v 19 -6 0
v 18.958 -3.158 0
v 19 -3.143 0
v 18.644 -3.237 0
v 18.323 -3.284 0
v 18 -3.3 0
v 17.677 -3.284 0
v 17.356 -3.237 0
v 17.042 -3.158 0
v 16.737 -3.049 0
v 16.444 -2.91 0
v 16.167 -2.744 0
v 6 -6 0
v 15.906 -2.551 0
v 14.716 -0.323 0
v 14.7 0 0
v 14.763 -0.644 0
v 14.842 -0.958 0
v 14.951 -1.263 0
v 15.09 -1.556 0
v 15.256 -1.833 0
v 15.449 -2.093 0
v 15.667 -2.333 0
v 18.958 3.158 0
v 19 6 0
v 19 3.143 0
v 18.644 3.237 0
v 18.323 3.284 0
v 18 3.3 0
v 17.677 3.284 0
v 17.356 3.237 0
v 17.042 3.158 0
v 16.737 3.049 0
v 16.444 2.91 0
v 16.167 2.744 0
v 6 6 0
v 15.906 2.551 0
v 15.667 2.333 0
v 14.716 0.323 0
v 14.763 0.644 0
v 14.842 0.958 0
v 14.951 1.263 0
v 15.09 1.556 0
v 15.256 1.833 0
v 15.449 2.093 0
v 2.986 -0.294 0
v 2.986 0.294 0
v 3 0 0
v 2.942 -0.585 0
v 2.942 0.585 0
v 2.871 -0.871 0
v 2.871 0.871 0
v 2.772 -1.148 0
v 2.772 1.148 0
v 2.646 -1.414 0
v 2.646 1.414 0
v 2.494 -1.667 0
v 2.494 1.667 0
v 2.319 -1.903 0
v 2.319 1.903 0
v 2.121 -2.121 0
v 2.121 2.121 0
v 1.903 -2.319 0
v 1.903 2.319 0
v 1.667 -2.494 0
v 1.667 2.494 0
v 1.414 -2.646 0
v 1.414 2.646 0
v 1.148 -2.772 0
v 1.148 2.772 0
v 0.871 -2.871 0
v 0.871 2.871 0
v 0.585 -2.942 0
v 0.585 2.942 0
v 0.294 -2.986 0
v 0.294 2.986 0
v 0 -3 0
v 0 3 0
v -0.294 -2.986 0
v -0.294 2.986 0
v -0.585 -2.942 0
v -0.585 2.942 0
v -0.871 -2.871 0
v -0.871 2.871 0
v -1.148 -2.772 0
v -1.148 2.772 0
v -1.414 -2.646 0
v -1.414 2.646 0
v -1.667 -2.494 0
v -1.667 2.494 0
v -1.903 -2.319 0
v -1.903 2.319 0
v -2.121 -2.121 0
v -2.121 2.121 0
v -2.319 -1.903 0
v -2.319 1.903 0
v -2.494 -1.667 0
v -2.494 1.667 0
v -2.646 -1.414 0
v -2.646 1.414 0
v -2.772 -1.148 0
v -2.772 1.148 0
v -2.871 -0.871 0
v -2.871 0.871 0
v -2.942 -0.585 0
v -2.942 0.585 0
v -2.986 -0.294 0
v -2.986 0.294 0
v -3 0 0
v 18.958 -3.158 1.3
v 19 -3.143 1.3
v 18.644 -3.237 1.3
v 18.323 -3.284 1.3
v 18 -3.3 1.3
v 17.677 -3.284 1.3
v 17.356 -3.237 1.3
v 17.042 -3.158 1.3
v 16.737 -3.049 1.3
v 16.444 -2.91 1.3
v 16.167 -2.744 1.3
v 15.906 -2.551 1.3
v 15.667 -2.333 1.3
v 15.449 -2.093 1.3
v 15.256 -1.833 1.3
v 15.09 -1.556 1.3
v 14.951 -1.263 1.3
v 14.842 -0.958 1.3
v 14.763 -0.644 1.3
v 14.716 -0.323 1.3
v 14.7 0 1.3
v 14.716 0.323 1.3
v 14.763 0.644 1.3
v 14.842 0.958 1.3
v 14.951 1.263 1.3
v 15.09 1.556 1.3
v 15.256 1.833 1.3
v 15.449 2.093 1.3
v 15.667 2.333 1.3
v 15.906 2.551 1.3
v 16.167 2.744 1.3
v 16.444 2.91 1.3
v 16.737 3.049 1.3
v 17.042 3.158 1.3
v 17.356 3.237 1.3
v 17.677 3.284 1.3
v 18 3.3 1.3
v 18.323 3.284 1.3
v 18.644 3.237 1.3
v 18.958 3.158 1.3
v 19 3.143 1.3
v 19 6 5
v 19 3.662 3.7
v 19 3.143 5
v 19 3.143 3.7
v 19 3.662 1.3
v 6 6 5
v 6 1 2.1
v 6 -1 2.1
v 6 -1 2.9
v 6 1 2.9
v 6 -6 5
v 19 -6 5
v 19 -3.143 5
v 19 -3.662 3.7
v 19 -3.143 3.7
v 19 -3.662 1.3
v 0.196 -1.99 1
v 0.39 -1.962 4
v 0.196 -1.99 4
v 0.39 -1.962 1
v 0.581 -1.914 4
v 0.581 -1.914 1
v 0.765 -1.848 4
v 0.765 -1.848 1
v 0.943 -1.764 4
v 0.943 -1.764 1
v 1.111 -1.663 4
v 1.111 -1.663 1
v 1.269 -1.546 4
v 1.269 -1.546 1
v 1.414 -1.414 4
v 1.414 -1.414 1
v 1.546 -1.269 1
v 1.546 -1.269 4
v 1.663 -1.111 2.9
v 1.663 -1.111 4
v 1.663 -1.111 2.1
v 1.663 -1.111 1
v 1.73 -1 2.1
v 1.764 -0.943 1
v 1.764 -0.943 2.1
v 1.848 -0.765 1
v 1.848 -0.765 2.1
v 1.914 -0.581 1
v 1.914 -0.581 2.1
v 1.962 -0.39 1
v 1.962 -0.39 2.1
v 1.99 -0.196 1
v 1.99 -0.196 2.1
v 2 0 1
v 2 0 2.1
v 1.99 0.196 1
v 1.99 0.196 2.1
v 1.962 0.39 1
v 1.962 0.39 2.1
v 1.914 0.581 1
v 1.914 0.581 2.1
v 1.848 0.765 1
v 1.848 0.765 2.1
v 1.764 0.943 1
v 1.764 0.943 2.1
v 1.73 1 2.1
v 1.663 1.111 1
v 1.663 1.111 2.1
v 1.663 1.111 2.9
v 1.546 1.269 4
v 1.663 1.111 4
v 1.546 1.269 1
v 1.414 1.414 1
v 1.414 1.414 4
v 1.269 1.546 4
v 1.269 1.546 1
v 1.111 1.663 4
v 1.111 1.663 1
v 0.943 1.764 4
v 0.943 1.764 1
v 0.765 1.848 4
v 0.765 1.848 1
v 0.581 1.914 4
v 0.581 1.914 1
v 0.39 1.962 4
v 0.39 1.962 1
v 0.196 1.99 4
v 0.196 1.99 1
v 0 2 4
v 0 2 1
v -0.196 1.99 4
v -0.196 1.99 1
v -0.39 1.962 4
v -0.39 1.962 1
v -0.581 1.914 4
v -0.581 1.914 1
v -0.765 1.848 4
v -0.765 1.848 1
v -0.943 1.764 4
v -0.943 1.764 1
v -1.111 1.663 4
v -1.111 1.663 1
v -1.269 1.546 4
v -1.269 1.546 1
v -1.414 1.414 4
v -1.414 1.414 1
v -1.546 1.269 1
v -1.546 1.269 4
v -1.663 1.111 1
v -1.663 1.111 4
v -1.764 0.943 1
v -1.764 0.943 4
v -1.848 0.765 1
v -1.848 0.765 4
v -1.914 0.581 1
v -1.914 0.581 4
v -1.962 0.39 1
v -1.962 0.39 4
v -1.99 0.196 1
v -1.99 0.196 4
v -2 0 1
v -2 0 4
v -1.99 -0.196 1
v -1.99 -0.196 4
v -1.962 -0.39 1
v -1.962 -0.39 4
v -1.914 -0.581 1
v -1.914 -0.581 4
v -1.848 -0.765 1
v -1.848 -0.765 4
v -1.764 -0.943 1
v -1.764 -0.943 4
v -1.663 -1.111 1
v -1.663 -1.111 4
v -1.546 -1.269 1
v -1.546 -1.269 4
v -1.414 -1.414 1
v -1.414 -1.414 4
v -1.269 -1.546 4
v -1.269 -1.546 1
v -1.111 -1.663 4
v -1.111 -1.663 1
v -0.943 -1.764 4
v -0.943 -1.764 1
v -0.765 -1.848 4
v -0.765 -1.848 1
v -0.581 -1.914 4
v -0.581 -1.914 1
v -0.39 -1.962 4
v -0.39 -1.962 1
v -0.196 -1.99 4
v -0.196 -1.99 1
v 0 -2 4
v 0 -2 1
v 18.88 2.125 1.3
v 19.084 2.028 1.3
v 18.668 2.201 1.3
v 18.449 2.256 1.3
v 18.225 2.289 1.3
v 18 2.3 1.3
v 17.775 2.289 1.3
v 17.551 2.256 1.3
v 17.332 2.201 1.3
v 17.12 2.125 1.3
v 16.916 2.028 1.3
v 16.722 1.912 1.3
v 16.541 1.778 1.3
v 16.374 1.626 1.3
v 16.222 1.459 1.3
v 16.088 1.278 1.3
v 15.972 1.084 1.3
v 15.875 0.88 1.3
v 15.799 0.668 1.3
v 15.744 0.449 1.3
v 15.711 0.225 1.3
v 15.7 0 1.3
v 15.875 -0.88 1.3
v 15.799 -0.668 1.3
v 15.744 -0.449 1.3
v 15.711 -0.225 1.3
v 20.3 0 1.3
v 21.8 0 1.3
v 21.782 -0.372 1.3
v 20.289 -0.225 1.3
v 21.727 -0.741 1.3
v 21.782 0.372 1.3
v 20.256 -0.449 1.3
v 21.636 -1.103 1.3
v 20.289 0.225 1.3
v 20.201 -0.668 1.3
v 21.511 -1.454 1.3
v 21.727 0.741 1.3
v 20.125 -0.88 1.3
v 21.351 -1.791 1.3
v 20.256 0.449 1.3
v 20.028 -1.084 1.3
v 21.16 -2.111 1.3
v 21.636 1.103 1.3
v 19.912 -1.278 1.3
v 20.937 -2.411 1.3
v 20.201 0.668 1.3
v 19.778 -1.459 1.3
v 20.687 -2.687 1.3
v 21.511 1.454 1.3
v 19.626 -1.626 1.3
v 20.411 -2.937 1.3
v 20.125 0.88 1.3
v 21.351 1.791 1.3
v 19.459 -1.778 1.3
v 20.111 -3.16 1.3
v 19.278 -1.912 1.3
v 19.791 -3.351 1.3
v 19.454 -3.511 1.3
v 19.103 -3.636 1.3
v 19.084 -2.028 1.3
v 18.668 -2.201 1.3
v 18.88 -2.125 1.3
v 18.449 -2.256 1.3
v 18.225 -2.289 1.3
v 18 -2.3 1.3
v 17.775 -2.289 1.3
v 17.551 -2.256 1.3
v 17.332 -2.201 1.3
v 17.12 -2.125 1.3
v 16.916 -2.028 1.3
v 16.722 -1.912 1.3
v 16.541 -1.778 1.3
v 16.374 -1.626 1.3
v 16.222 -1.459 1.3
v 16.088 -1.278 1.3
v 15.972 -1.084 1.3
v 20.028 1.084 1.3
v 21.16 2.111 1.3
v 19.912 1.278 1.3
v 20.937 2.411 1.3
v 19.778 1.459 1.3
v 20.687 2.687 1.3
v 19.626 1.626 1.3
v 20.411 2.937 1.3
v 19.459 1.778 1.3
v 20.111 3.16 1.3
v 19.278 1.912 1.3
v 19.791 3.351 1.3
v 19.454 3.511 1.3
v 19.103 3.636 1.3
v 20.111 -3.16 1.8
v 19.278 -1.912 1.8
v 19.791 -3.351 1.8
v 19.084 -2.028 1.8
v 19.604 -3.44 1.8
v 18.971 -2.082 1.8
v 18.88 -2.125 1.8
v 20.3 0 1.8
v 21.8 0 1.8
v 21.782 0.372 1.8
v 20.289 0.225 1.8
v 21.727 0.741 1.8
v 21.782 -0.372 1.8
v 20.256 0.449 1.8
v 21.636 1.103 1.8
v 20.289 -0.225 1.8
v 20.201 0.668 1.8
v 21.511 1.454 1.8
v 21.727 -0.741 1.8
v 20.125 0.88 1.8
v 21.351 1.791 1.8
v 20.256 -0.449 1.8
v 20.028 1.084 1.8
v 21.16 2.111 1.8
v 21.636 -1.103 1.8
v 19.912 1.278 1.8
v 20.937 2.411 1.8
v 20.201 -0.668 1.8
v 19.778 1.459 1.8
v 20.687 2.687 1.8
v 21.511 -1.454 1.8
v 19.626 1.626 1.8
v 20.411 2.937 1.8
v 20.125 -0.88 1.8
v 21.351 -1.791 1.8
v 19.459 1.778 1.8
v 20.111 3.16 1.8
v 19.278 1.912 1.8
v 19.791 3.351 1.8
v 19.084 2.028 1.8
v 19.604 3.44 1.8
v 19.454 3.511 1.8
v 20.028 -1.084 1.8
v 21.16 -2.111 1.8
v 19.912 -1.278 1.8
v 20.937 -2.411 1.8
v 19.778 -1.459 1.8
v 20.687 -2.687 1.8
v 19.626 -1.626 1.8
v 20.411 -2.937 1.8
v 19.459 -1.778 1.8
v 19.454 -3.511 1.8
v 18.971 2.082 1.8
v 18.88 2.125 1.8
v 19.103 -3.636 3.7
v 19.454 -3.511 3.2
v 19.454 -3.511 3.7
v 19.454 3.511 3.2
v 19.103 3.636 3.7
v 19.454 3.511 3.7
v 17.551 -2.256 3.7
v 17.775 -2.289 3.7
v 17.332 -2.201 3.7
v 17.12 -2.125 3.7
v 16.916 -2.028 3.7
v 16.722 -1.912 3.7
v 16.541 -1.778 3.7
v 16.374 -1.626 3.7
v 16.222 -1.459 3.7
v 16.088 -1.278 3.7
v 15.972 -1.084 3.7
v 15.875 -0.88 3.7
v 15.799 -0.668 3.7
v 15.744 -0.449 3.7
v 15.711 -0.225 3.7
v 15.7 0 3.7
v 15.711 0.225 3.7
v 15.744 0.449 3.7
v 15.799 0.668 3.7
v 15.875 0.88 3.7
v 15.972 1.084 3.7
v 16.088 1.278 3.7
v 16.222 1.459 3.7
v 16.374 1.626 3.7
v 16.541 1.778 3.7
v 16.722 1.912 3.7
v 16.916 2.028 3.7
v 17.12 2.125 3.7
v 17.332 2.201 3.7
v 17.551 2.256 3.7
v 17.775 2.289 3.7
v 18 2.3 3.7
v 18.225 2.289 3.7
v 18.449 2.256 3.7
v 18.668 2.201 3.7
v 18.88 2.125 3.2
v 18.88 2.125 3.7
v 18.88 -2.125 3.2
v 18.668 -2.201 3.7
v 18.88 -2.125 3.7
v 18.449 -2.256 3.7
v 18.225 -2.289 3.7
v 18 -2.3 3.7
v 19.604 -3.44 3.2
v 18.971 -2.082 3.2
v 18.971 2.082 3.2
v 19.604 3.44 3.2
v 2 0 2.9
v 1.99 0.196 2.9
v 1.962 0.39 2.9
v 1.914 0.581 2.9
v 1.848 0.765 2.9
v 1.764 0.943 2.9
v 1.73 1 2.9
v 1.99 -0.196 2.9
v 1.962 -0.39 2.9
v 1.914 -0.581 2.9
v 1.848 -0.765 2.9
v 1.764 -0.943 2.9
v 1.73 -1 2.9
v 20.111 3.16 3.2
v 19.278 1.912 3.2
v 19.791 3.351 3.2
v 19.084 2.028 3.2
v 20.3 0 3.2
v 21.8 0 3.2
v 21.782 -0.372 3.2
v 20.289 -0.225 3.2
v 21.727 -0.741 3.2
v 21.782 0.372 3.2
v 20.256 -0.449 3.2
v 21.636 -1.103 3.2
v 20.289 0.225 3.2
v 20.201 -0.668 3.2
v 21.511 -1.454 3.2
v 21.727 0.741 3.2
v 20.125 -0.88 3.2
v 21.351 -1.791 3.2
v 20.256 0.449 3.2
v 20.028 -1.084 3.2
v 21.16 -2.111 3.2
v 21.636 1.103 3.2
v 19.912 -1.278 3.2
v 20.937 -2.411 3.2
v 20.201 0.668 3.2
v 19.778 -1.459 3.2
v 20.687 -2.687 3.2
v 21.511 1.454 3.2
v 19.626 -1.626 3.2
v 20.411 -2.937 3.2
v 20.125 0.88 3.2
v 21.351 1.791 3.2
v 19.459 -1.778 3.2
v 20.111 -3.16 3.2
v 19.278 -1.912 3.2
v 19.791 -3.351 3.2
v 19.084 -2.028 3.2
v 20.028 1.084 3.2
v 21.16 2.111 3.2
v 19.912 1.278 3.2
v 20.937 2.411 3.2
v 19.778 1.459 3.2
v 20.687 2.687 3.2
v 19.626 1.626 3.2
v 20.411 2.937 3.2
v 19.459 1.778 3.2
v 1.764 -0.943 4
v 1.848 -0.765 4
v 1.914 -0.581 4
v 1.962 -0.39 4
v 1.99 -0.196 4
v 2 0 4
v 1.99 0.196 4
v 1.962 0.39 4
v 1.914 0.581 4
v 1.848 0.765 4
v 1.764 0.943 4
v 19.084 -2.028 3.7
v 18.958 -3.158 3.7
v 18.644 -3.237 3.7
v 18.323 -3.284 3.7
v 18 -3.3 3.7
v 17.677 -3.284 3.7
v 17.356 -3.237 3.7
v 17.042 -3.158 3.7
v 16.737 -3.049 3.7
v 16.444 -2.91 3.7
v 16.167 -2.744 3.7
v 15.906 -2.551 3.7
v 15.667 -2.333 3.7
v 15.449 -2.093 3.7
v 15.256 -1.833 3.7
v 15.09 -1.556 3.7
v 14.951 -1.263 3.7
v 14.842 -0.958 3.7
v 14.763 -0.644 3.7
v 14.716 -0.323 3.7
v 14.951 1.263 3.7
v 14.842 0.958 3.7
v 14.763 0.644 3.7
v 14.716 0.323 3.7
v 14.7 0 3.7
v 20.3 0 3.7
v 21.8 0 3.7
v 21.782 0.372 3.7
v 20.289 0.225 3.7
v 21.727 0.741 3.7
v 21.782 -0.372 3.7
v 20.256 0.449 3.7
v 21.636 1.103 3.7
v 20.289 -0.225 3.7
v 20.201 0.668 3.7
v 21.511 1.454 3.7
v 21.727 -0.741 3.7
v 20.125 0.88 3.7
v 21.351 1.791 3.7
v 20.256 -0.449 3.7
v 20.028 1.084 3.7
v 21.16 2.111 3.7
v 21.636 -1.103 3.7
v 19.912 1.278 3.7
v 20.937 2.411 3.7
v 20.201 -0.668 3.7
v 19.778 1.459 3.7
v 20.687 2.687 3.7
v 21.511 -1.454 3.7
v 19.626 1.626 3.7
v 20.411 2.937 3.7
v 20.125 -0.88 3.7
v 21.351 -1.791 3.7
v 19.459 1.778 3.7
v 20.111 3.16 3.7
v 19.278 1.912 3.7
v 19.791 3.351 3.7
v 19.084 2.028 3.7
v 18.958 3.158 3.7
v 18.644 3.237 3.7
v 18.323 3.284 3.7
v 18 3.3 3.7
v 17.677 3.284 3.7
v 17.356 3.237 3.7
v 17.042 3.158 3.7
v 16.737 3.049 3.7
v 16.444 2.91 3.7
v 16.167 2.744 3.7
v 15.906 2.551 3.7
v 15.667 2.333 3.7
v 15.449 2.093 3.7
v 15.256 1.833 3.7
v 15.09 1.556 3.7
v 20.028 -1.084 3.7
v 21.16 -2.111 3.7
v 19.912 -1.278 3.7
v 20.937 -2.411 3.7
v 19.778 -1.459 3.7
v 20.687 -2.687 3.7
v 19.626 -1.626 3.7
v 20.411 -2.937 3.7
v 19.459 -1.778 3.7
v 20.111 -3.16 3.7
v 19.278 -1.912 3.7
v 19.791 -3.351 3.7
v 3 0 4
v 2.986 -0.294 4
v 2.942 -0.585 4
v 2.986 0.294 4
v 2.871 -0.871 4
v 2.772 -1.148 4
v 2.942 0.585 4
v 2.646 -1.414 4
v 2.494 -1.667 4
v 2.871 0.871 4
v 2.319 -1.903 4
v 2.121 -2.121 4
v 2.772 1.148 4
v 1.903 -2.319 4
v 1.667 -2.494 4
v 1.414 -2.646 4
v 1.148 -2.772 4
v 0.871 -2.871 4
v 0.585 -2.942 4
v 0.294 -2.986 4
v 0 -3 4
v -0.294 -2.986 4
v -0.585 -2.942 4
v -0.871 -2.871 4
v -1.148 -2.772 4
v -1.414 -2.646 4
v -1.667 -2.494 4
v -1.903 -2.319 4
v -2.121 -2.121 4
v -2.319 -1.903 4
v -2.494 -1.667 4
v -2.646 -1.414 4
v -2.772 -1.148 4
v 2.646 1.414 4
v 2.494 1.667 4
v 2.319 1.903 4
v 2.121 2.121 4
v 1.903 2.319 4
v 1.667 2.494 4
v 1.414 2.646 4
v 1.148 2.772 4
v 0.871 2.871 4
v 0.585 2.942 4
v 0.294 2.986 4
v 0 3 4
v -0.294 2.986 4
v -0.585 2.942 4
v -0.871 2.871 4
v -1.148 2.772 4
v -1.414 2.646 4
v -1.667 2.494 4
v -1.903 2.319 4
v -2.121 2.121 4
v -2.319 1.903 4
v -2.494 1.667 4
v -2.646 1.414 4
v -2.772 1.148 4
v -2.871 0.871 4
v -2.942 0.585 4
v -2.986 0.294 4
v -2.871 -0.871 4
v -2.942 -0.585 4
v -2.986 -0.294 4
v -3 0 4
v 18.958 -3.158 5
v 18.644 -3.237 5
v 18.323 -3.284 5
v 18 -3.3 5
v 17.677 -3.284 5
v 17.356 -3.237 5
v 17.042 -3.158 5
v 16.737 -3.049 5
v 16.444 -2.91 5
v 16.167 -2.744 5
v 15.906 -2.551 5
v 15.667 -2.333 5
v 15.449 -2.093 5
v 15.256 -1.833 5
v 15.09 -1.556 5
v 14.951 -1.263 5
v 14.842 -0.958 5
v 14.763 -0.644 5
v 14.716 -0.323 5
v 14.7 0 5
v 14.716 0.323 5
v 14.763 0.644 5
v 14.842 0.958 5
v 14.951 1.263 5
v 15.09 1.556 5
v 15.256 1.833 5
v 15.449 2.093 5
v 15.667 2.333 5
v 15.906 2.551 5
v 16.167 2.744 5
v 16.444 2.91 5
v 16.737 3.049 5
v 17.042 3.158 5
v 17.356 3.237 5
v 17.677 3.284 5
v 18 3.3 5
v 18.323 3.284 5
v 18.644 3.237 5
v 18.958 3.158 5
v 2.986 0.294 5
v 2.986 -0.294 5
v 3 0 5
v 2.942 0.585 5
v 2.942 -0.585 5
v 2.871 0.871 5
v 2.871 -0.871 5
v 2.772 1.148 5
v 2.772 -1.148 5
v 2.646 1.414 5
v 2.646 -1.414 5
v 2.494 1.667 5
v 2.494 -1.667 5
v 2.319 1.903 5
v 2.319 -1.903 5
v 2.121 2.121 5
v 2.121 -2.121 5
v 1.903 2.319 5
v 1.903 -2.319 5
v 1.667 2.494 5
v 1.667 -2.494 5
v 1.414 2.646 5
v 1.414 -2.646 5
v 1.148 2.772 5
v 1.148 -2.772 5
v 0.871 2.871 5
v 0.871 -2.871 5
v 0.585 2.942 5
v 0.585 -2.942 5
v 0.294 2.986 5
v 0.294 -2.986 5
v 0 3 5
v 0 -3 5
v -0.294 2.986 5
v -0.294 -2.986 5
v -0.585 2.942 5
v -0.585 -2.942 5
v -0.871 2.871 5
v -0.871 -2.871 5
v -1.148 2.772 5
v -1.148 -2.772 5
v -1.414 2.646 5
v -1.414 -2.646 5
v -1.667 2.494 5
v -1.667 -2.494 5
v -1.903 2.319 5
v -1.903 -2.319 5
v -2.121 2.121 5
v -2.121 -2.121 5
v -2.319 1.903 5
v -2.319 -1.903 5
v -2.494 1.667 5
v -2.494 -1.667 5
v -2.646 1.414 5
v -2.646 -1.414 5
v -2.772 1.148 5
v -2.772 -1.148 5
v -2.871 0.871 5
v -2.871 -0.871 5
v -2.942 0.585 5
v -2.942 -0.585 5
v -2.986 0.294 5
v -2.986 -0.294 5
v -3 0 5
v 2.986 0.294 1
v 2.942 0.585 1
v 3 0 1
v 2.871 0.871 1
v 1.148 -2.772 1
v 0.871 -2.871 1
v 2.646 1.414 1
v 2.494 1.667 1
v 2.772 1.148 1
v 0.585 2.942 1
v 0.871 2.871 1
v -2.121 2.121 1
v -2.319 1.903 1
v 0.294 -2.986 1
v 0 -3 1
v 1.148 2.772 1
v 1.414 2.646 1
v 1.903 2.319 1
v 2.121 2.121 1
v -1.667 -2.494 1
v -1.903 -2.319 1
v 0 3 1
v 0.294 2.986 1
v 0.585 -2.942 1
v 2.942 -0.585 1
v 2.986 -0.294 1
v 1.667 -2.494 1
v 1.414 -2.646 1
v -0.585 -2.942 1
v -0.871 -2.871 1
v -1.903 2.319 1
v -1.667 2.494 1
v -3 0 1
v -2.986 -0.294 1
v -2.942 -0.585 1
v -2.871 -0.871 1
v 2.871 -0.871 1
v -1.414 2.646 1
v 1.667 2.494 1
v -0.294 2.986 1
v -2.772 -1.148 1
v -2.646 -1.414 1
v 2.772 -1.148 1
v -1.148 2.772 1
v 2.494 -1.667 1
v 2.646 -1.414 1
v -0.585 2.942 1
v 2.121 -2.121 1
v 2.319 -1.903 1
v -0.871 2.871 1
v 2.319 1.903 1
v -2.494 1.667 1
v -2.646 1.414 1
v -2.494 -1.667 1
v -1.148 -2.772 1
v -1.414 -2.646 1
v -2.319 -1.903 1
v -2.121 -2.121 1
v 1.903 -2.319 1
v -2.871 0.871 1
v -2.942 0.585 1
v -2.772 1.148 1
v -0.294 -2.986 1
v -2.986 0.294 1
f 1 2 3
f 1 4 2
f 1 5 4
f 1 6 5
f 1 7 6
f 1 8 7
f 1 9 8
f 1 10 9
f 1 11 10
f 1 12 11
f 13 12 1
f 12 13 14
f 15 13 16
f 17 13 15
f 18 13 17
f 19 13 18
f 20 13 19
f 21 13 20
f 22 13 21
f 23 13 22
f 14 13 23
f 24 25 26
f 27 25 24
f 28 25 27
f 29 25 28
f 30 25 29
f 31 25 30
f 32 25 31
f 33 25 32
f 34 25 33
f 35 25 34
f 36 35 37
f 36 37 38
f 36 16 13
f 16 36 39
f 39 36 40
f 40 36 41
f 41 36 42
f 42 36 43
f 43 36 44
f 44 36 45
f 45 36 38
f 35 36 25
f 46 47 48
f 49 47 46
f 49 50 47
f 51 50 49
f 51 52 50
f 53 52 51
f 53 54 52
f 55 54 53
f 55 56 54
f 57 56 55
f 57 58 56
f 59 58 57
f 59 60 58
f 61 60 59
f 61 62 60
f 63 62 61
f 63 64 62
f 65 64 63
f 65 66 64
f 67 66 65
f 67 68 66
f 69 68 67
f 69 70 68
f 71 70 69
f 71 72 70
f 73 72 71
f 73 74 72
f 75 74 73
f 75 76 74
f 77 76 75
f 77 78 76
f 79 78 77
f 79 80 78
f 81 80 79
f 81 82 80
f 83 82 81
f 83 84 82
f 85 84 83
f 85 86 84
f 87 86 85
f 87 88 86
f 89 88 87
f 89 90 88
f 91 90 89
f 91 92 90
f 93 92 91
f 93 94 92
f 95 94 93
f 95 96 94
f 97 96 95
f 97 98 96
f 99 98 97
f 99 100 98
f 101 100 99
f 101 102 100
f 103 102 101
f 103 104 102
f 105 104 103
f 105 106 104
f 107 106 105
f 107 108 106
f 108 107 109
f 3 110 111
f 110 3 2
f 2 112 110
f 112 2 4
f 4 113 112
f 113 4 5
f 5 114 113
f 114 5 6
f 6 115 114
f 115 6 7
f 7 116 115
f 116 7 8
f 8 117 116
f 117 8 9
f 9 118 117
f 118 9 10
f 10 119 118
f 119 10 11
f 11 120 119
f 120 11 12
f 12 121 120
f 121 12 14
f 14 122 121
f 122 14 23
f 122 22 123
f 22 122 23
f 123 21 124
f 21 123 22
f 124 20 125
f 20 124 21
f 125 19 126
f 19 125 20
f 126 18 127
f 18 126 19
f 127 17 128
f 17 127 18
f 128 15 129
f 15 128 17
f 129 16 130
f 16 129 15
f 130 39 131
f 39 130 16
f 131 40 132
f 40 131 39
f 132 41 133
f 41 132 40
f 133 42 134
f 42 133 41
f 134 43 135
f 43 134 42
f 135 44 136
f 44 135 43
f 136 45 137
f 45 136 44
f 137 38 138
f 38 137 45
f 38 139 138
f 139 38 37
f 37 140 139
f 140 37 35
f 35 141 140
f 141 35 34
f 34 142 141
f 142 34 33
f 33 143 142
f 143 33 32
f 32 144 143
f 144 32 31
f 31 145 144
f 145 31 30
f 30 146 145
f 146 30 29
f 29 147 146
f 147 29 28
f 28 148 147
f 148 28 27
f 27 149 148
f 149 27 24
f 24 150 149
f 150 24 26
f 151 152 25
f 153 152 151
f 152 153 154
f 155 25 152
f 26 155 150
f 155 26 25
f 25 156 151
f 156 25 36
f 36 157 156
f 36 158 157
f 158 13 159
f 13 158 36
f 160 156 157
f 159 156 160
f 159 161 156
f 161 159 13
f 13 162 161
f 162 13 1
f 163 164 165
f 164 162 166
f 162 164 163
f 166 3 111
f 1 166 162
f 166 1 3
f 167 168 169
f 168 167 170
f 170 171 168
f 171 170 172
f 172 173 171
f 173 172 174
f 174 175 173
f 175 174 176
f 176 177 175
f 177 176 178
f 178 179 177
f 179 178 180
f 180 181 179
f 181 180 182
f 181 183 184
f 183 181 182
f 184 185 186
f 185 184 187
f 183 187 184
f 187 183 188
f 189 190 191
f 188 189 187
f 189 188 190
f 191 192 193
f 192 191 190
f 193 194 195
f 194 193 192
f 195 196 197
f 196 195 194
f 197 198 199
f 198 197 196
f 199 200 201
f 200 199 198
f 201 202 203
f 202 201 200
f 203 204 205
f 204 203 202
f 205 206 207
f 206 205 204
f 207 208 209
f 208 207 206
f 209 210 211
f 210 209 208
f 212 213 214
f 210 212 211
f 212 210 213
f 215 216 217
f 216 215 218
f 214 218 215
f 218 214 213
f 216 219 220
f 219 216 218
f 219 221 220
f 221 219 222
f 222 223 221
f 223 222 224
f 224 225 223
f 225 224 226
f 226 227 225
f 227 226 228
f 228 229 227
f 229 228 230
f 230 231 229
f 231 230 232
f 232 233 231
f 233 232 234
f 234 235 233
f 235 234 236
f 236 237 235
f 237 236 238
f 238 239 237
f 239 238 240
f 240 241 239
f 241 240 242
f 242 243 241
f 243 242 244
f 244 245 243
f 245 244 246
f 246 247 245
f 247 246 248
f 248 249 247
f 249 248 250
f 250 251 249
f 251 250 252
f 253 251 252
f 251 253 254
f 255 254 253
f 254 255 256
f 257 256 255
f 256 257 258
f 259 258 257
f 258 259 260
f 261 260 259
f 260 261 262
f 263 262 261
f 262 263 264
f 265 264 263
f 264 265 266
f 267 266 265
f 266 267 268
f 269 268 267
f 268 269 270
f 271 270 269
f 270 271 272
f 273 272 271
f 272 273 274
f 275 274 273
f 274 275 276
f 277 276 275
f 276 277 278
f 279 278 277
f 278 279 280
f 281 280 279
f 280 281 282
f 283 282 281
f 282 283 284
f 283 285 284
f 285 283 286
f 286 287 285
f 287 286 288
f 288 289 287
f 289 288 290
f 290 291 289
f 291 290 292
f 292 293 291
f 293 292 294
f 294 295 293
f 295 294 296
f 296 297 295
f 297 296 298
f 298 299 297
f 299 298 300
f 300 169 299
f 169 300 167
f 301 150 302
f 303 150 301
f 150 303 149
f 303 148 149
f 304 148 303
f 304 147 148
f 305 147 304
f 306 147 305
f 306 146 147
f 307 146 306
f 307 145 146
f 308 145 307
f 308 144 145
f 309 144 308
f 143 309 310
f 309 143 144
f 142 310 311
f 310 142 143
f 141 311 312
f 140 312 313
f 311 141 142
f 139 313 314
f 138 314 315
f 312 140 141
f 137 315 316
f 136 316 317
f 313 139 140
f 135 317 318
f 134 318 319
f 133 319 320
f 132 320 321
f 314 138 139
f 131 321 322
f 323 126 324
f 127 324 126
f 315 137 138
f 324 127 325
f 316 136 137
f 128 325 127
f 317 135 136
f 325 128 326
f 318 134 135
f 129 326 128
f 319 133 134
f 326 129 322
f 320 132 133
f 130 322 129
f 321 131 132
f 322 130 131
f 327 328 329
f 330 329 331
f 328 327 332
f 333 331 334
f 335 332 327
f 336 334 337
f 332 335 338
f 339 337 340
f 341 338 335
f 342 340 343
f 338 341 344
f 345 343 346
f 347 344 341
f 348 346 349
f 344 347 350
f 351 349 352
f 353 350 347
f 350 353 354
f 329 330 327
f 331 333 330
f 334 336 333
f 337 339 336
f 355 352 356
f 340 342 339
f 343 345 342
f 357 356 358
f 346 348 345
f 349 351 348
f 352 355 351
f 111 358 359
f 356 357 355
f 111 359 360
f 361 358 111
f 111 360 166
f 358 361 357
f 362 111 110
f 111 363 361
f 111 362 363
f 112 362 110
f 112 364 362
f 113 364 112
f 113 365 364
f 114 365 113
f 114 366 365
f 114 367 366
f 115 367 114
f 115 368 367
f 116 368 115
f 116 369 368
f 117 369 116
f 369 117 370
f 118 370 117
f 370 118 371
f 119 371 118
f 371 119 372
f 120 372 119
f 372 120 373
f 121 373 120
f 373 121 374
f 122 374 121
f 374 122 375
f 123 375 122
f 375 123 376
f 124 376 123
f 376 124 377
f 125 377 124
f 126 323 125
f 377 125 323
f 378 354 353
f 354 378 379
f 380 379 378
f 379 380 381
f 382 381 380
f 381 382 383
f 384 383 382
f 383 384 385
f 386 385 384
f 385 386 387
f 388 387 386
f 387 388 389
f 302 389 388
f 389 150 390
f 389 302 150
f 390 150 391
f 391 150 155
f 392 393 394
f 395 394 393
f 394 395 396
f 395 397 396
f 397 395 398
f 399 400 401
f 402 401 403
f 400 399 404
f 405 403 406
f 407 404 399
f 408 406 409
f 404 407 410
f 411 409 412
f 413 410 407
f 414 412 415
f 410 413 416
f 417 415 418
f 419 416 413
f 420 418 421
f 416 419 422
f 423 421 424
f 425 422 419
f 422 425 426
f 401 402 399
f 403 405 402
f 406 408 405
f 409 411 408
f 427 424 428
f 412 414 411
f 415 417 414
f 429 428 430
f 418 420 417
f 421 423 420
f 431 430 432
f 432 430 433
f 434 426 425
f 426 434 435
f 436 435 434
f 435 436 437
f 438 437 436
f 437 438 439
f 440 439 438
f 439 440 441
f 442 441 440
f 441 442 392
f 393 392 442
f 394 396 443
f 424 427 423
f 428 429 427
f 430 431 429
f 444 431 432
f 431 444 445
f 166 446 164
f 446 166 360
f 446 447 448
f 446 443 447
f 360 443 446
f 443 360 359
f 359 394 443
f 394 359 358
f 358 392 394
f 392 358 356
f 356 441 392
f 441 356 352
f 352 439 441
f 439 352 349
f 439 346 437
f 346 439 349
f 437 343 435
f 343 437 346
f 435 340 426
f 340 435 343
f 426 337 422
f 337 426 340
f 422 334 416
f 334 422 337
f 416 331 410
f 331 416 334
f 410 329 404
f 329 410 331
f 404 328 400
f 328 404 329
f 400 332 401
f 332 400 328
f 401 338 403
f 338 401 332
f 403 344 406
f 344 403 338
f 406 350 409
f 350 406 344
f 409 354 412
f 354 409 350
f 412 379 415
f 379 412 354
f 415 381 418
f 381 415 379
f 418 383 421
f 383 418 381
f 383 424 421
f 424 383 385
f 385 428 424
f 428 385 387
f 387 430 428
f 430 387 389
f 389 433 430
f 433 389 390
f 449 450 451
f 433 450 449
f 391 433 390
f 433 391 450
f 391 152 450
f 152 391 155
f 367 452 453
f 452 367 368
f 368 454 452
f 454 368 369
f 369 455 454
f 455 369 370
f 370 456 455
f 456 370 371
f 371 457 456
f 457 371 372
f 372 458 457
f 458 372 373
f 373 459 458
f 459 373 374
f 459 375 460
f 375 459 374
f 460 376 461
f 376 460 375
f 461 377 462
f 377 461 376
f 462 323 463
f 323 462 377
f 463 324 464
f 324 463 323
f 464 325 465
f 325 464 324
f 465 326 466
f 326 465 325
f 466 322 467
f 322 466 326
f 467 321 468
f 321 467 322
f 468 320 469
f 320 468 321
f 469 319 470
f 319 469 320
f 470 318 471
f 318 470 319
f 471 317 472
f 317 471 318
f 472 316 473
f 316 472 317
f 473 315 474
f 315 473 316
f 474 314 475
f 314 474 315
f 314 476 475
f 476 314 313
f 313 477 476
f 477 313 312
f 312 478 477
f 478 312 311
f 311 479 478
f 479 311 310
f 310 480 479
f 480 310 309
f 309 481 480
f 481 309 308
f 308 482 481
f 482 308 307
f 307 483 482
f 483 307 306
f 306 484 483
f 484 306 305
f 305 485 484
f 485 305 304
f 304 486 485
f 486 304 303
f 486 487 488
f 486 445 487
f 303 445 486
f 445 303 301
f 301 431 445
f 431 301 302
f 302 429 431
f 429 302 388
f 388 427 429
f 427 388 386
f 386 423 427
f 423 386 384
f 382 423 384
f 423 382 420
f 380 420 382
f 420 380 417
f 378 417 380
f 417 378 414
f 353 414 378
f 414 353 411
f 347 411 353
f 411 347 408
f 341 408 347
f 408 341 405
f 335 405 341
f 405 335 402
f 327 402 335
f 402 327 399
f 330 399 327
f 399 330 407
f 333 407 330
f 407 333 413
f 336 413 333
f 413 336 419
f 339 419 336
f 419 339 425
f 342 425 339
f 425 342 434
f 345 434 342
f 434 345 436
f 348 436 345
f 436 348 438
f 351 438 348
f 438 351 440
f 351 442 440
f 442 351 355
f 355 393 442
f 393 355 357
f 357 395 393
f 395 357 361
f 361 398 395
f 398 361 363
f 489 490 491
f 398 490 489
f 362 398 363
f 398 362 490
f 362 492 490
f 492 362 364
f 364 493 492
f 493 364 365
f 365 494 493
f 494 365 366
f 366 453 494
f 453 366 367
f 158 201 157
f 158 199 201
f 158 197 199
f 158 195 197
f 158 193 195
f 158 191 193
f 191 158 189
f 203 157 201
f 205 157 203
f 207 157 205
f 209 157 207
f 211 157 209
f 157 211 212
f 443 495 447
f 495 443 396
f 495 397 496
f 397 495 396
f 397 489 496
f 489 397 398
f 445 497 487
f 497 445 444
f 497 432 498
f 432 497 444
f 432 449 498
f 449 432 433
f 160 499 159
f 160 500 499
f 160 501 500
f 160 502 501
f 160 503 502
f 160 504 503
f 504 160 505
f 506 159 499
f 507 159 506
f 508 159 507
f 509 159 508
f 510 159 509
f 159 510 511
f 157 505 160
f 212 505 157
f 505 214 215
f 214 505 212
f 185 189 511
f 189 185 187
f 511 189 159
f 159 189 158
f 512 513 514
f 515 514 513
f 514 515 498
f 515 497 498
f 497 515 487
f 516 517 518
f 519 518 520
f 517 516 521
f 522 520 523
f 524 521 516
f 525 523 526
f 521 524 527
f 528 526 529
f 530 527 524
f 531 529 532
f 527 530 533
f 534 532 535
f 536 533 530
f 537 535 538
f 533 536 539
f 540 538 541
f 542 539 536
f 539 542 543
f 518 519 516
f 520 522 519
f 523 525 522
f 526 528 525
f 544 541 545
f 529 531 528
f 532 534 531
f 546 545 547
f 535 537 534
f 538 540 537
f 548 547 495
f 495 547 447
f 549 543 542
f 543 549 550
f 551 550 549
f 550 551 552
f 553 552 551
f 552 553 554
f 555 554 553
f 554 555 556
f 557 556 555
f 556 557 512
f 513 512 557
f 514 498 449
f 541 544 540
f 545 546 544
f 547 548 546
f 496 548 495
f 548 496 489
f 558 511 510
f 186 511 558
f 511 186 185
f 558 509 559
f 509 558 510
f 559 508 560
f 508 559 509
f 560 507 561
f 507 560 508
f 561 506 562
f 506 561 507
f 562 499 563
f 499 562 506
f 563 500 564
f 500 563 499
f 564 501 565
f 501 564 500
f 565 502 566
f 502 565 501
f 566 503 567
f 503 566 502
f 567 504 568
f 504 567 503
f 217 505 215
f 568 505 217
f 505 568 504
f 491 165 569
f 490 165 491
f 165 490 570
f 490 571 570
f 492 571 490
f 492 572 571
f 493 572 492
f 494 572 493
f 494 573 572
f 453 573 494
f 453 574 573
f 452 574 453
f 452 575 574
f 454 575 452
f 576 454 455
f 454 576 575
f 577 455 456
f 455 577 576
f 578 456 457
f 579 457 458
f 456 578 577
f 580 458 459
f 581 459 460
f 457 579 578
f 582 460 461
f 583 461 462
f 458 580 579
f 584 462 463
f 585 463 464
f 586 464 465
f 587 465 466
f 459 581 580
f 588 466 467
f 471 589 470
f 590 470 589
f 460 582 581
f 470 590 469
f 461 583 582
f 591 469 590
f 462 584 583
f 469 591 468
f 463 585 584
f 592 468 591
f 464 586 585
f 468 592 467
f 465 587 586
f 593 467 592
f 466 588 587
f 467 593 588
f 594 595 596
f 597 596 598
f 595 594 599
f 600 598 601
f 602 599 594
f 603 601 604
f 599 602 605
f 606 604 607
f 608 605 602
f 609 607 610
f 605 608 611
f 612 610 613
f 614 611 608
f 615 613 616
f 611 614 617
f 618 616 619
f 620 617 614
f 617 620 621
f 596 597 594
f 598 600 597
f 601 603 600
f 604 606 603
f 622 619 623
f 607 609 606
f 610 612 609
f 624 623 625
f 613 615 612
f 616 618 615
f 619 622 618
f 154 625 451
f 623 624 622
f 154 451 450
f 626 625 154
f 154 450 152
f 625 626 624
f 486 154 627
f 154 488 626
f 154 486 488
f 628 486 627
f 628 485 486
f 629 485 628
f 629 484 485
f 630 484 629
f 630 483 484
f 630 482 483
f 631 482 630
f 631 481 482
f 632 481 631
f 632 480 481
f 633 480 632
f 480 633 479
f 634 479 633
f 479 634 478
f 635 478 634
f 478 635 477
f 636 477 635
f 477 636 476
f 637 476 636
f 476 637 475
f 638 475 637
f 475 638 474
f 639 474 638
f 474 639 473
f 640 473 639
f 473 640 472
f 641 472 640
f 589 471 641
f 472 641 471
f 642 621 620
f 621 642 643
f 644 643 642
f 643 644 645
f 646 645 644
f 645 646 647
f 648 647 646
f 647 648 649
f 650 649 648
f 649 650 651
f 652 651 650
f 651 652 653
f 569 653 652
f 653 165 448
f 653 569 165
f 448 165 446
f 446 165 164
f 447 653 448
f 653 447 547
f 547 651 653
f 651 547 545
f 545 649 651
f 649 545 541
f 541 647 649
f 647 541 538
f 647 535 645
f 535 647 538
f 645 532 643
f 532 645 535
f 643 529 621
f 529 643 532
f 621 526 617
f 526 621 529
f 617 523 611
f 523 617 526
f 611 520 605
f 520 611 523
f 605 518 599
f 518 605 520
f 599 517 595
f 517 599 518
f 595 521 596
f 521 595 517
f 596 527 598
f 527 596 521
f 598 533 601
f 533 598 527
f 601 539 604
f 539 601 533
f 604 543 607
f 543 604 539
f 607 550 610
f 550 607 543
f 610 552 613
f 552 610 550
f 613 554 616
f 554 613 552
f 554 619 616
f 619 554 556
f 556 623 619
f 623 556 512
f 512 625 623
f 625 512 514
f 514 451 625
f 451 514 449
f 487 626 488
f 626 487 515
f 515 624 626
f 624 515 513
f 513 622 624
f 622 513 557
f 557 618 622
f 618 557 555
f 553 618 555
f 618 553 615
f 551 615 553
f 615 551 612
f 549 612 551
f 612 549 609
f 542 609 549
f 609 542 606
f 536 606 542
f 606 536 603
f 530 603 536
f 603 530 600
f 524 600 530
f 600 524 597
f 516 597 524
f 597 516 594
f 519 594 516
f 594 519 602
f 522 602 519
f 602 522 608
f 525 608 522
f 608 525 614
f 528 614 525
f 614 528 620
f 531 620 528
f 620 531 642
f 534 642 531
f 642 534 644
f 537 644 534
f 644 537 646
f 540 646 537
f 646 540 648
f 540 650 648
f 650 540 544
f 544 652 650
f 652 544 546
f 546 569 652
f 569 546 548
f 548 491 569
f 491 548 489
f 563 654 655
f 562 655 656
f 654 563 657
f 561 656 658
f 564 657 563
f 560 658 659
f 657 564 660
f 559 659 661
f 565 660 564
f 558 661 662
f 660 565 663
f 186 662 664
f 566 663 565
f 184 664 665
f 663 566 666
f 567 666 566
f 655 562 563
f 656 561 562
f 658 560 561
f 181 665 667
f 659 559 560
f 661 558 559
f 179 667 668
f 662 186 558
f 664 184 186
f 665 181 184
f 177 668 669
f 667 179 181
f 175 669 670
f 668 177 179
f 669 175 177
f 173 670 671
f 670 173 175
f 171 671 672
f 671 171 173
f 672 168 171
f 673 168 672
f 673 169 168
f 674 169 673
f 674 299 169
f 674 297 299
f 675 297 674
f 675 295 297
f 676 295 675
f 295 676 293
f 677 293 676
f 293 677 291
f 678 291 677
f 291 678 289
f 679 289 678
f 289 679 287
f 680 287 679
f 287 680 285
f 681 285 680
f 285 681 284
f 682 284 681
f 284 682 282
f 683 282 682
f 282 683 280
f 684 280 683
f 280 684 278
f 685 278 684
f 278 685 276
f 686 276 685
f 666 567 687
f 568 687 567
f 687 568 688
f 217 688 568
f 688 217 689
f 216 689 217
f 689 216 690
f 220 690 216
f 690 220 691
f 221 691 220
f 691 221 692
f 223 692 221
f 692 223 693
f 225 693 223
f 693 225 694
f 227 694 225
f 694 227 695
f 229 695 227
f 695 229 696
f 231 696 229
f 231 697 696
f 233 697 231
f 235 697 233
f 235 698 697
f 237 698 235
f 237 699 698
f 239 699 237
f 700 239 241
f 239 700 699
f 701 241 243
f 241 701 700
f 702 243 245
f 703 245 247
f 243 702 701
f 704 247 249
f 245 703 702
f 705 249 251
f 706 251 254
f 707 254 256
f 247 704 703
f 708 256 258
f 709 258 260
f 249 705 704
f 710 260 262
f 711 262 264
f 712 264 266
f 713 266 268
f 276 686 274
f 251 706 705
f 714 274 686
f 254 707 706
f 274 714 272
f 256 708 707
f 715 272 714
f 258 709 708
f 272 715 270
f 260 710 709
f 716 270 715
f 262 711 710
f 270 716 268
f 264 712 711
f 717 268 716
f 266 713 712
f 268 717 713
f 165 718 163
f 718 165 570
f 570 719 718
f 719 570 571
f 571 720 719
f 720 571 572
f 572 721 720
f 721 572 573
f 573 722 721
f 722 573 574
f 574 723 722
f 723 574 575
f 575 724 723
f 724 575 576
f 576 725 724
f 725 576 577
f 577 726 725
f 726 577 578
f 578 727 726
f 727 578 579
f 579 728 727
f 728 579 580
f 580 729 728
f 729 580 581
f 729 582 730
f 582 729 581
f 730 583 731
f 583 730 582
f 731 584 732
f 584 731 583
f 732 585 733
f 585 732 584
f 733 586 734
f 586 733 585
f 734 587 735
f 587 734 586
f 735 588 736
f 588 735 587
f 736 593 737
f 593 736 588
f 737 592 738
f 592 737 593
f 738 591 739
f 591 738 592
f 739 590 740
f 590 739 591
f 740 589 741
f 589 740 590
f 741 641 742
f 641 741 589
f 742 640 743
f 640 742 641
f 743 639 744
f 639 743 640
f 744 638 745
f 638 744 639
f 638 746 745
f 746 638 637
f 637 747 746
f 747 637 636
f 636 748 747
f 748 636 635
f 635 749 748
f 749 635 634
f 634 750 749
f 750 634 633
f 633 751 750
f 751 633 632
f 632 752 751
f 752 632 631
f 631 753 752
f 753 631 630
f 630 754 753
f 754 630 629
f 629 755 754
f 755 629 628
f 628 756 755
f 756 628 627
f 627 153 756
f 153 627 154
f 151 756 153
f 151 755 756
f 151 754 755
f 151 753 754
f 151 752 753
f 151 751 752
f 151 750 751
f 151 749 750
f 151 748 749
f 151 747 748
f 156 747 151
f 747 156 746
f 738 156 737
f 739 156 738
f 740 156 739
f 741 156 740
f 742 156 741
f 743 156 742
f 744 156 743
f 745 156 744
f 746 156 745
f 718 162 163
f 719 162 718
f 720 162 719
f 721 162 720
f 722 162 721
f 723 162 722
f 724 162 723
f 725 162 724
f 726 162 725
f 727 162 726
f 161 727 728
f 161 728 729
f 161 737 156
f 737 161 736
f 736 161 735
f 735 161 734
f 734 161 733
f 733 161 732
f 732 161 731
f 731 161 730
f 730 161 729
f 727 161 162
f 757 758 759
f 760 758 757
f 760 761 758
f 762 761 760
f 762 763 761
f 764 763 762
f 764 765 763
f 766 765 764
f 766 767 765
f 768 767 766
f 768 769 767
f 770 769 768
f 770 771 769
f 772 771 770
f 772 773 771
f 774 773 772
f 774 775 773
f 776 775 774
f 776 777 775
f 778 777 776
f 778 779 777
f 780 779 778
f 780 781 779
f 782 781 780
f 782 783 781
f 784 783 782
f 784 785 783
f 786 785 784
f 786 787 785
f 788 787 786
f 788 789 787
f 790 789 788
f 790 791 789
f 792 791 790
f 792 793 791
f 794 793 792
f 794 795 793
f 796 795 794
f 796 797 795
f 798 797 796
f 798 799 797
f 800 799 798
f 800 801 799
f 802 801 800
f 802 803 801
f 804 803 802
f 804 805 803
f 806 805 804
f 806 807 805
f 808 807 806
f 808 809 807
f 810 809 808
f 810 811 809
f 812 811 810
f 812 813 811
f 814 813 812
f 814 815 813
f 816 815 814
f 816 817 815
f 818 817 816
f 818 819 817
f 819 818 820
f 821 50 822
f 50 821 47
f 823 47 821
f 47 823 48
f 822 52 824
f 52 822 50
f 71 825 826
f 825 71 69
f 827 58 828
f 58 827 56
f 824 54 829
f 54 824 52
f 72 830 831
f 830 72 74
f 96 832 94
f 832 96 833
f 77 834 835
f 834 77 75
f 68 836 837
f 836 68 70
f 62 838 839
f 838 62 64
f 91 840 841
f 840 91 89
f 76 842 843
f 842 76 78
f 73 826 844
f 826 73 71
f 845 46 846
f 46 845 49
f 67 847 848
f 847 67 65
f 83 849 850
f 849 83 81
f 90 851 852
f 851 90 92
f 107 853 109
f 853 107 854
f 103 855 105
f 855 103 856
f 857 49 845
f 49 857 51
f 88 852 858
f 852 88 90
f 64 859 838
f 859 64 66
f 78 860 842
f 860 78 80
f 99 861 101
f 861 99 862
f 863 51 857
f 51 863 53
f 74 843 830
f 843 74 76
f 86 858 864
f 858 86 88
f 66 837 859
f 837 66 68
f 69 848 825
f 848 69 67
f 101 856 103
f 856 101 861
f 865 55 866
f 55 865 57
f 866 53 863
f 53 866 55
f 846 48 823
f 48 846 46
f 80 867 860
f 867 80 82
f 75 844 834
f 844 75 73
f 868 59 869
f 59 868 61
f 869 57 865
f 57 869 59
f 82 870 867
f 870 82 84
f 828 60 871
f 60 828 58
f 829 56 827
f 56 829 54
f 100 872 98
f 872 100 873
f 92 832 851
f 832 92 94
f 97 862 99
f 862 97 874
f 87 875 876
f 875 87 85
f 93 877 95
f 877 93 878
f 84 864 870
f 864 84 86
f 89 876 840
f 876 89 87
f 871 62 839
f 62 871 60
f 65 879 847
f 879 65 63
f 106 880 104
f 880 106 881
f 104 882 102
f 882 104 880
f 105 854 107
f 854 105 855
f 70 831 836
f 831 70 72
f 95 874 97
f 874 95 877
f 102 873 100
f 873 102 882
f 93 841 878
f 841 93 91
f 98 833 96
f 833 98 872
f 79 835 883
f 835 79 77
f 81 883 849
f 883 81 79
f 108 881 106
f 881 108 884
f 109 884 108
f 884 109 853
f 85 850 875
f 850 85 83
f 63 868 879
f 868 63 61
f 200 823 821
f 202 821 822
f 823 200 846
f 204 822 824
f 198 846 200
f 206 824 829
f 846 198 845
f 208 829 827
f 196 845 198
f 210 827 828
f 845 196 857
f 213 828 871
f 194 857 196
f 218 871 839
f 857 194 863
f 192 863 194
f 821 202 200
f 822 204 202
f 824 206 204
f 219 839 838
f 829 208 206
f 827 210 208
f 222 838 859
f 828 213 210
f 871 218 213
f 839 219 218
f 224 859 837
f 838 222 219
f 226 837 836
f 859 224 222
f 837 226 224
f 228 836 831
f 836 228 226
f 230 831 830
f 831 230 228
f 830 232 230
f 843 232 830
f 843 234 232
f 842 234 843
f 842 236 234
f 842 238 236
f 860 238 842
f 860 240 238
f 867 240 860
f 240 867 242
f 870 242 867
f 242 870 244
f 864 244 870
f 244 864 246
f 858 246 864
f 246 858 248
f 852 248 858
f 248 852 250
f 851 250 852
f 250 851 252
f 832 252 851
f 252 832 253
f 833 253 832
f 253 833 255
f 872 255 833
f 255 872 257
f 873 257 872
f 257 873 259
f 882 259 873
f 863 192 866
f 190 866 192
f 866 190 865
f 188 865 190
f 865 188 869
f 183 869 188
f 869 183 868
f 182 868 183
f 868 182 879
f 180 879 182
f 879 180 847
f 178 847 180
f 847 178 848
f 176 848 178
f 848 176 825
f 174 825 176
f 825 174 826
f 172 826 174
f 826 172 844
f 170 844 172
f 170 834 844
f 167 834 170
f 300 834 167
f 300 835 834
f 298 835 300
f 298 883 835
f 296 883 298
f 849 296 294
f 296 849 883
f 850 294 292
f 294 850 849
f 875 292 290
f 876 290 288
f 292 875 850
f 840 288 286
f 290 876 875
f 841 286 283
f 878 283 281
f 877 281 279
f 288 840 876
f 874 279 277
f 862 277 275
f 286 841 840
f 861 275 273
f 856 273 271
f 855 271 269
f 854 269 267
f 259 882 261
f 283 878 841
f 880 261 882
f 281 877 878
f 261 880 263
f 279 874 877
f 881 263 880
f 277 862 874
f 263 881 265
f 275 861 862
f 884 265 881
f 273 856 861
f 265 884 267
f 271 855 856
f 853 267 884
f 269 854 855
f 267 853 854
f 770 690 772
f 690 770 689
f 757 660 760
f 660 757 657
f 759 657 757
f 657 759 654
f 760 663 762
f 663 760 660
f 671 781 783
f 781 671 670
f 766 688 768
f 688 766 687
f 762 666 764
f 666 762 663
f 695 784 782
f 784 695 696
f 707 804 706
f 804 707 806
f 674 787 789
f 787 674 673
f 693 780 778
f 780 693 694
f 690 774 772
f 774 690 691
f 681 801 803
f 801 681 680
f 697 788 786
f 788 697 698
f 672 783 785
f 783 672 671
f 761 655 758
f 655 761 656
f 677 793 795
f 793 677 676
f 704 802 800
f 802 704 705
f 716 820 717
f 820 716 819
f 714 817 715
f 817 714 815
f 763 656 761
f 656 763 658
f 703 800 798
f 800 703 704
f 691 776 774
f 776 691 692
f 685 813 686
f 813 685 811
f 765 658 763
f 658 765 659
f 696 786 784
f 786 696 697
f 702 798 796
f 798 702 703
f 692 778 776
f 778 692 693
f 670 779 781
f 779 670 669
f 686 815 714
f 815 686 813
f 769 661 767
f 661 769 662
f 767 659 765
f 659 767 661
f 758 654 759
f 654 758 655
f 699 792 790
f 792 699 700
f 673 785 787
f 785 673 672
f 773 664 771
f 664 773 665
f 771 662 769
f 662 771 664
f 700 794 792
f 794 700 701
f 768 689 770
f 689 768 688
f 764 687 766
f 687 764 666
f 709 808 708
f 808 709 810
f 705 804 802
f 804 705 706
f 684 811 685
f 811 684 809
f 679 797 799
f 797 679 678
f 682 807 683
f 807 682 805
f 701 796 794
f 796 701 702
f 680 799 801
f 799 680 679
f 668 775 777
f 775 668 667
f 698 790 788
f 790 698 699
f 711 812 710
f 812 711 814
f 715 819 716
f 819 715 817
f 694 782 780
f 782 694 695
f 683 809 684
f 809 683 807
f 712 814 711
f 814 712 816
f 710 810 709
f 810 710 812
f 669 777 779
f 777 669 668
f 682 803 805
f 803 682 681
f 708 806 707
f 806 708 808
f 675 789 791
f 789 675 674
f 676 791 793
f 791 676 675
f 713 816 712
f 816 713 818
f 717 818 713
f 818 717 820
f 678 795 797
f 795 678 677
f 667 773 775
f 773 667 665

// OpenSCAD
part = "link"; // [link, assembly]
cadverify_only = "";
module instance(name, part, unit = 1) {
    echo(cadverify_instance = [name, part, unit]);
    if (cadverify_only == "" || cadverify_only == name) children();
}

// Parameters (mm)
pitch = 18;          // pin-to-bore distance (10 links = 180mm)
link_w = 12;         // width (Y)
link_t = 5;          // thickness (Z)
pin_d = 4;           // pin shaft diameter
bore_d = 4.6;        // bore diameter (0.3 radial clearance)
cap_d = 6;           // cap diameter
cap_h = 1;           // cap thickness
kn_out_d = 7.6;      // knuckle outer diameter (1.5 wall)
cap_cav_d = 6.6;     // cap clearance diameter (0.3 radial)
neck_w = 2;          // neck width
neck_t = 0.8;        // neck thickness (central only)
slot_half = 65;      // slot half-angle (deg), allows +-30 deg swing
yoke_west = 6;       // yoke west edge (local X)
yoke_east = 19;      // yoke east extent (local X)
$fn = 64;

module link_geom() {
    bore_x = pitch;
    pin_r = pin_d/2;
    bore_r = bore_d/2;
    kn_out_r = kn_out_d/2;
    cav_r = cap_cav_d/2;
    cap_r = cap_d/2;
    wedge_far = 30;
    dy_far = wedge_far * tan(slot_half);
    // Z stack
    z0=0; z1=cap_h;              // 0..1 bottom
    z2=z1+0.3;                   // 1..1.3 lower cap clearance
    z3=z2+0.5;                   // 1.3..1.8 lower lip (closed)
    z4=z3+0.3;                   // 1.8..2.1 lower neck gap (slotted)
    z5=z4+neck_t;                // 2.1..2.9 central (slotted, neck lives)
    z6=z5+0.3;                   // 2.9..3.2 upper neck gap (slotted)
    z7=z6+0.5;                   // 3.2..3.7 upper lip (closed)
    z8=z7+0.3;                   // 3.7..4.0 upper cap clearance
    z9=z8+cap_h;                 // 4..5 top
    // 2D helpers (modules can't take shapes, so inline each layer)
    // bottom (0..1)
    translate([0,0,z0]) linear_extrude(height=z1-z0, convexity=8) {
        difference() {
            union() {
                circle(r=pin_r);
                translate([yoke_west,-link_w/2]) square([yoke_east-yoke_west, link_w]);
            }
            translate([bore_x,0]) circle(r=cav_r);
        }
    }
    // lower cap clearance (1..1.3)
    translate([0,0,z1]) linear_extrude(height=z2-z1, convexity=8) {
        difference() {
            union() {
                circle(r=pin_r);
                translate([yoke_west,-link_w/2]) square([yoke_east-yoke_west, link_w]);
            }
            translate([bore_x,0]) circle(r=cav_r);
        }
    }
    // lower lip (1.3..1.8) closed bore
    translate([0,0,z2]) linear_extrude(height=z3-z2, convexity=8) {
        difference() {
            union() {
                circle(r=pin_r);
                translate([yoke_west,-link_w/2]) square([yoke_east-yoke_west, link_w]);
                translate([bore_x,0]) circle(r=kn_out_r);
            }
            translate([bore_x,0]) circle(r=bore_r);
        }
    }
    // lower neck gap (1.8..2.1) slotted
    translate([0,0,z3]) linear_extrude(height=z4-z3, convexity=8) {
        difference() {
            union() {
                circle(r=pin_r);
                translate([yoke_west,-link_w/2]) square([yoke_east-yoke_west, link_w]);
                translate([bore_x,0]) circle(r=kn_out_r);
            }
            translate([bore_x,0]) circle(r=bore_r);
            polygon(points=[[bore_x,0],[bore_x+wedge_far,dy_far],[bore_x+wedge_far,-dy_far]]);
        }
    }
    // central (2.1..2.9) slotted + neck
    translate([0,0,z4]) linear_extrude(height=z5-z4, convexity=8) {
        difference() {
            union() {
                circle(r=pin_r);
                translate([0,-neck_w/2]) square([yoke_west+1, neck_w]);
                translate([yoke_west,-link_w/2]) square([yoke_east-yoke_west, link_w]);
                translate([bore_x,0]) circle(r=kn_out_r);
            }
            translate([bore_x,0]) circle(r=bore_r);
            polygon(points=[[bore_x,0],[bore_x+wedge_far,dy_far],[bore_x+wedge_far,-dy_far]]);
        }
    }
    // upper neck gap (2.9..3.2) slotted
    translate([0,0,z5]) linear_extrude(height=z6-z5, convexity=8) {
        difference() {
            union() {
                circle(r=pin_r);
                translate([yoke_west,-link_w/2]) square([yoke_east-yoke_west, link_w]);
                translate([bore_x,0]) circle(r=kn_out_r);
            }
            translate([bore_x,0]) circle(r=bore_r);
            polygon(points=[[bore_x,0],[bore_x+wedge_far,dy_far],[bore_x+wedge_far,-dy_far]]);
        }
    }
    // upper lip (3.2..3.7) closed
    translate([0,0,z6]) linear_extrude(height=z7-z6, convexity=8) {
        difference() {
            union() {
                circle(r=pin_r);
                translate([yoke_west,-link_w/2]) square([yoke_east-yoke_west, link_w]);
                translate([bore_x,0]) circle(r=kn_out_r);
            }
            translate([bore_x,0]) circle(r=bore_r);
        }
    }
    // upper cap clearance (3.7..4)
    translate([0,0,z7]) linear_extrude(height=z8-z7, convexity=8) {
        difference() {
            union() {
                circle(r=pin_r);
                translate([yoke_west,-link_w/2]) square([yoke_east-yoke_west, link_w]);
            }
            translate([bore_x,0]) circle(r=cav_r);
        }
    }
    // top (4..5)
    translate([0,0,z8]) linear_extrude(height=z9-z8, convexity=8) {
        difference() {
            union() {
                circle(r=pin_r);
                translate([yoke_west,-link_w/2]) square([yoke_east-yoke_west, link_w]);
            }
            translate([bore_x,0]) circle(r=cav_r);
        }
    }
    // caps (pin ends)
    translate([0,0,0]) cylinder(h=cap_h, r=cap_r);
    translate([0,0,link_t-cap_h]) cylinder(h=cap_h, r=cap_r);
}

if (part == "assembly") {
    instance("link1", "link", 1) translate([0,0,0]) link_geom();
    instance("link2", "link", 1) translate([18,0,0]) link_geom();
    instance("link3", "link", 1) translate([36,0,0]) link_geom();
    echo(cadverify_spec = [
        ["bounds", [[-3, -6, 0], [57.9, 6, 5]]],
        ["support_faces", [["bed", "-z", 200]]],
        ["motions", [
            ["bend", ["link3"], "rotate", [36, 0, 0], [0, 0, 1], [-30, 30]]
        ]],
        ["assembly_order", [
            [["link1", "link2", "link3"], [0, 0, 0]]
        ]],
        ["print_in_place", 0.3],
        ["overhangs_allowed", [
            ["pin cap link1", [[-3, -3, 3.8], [3, 3, 4.2]]],
            ["knuckle joint1", [[14, -4, 1.0], [22, 4, 2.0]]],
            ["upper lip joint1", [[14, -4, 3.0], [22, 4, 3.4]]],
            ["neck link1", [[0, -1.5, 1.9], [7, 1.5, 3.1]]],
            ["pin cap link2", [[15, -3, 3.8], [21, 3, 4.2]]],
            ["knuckle joint2", [[32, -4, 1.0], [40, 4, 2.0]]],
            ["upper lip joint2", [[32, -4, 3.0], [40, 4, 3.4]]],
            ["neck link2", [[18, -1.5, 1.9], [25, 1.5, 3.1]]],
            ["pin cap link3", [[33, -3, 3.8], [39, 3, 4.2]]],
            ["knuckle joint3", [[50, -4, 1.0], [58, 4, 2.0]]],
            ["upper lip joint3", [[50, -4, 3.0], [58, 4, 3.4]]],
            ["neck link3", [[36, -1.5, 1.9], [43, 1.5, 3.1]]]
        ]],
        ["held", ["link1", "link2", "link3"]]
    ]);
} else {
    link_geom();
    echo(cadverify_spec = [
        ["bounds", [[-3, -6, 0], [21.9, 6, 5]]],
        ["bodies", 1],
        ["through_holes", 2],
        ["support_faces", [["bed", "-z", 100]]],
        ["overhangs_allowed", [
            ["pin cap", [[-3, -3, 3.8], [3, 3, 4.2]]],
            ["knuckle ceiling", [[14, -4, 1.0], [22, 4, 2.0]]],
            ["upper lip", [[14, -4, 3.0], [22, 4, 3.4]]],
            ["neck underside", [[0, -1.5, 1.9], [7, 1.5, 3.1]]]
        ]],
        ["copies", 3],
        ["details", [
            ["body", "material", [[6, -6, 0], [14, 6, 5]], 0.85],
            ["neck", "material", [[0, -1, 2.1], [7, 1, 2.9]], 0.8],
            ["knuckle", "material", [[14.2, -3.8, 1.3], [21.8, 3.8, 3.7]], 0.25],
            ["slot", "void", [[19, -1, 2.1], [21, 1, 2.9]], 0.8],
            ["cap_cavity", "void", [[14.7, -3.3, 0], [21.3, 3.3, 1]], 0.5],
            ["wall", "thickness", [18, 7, 2.5], [0, -1, 0], 3.7],
            ["floor", "thickness", [9, 0, -1], [0, 0, 1], 5]
        ]]
    ]);
}
